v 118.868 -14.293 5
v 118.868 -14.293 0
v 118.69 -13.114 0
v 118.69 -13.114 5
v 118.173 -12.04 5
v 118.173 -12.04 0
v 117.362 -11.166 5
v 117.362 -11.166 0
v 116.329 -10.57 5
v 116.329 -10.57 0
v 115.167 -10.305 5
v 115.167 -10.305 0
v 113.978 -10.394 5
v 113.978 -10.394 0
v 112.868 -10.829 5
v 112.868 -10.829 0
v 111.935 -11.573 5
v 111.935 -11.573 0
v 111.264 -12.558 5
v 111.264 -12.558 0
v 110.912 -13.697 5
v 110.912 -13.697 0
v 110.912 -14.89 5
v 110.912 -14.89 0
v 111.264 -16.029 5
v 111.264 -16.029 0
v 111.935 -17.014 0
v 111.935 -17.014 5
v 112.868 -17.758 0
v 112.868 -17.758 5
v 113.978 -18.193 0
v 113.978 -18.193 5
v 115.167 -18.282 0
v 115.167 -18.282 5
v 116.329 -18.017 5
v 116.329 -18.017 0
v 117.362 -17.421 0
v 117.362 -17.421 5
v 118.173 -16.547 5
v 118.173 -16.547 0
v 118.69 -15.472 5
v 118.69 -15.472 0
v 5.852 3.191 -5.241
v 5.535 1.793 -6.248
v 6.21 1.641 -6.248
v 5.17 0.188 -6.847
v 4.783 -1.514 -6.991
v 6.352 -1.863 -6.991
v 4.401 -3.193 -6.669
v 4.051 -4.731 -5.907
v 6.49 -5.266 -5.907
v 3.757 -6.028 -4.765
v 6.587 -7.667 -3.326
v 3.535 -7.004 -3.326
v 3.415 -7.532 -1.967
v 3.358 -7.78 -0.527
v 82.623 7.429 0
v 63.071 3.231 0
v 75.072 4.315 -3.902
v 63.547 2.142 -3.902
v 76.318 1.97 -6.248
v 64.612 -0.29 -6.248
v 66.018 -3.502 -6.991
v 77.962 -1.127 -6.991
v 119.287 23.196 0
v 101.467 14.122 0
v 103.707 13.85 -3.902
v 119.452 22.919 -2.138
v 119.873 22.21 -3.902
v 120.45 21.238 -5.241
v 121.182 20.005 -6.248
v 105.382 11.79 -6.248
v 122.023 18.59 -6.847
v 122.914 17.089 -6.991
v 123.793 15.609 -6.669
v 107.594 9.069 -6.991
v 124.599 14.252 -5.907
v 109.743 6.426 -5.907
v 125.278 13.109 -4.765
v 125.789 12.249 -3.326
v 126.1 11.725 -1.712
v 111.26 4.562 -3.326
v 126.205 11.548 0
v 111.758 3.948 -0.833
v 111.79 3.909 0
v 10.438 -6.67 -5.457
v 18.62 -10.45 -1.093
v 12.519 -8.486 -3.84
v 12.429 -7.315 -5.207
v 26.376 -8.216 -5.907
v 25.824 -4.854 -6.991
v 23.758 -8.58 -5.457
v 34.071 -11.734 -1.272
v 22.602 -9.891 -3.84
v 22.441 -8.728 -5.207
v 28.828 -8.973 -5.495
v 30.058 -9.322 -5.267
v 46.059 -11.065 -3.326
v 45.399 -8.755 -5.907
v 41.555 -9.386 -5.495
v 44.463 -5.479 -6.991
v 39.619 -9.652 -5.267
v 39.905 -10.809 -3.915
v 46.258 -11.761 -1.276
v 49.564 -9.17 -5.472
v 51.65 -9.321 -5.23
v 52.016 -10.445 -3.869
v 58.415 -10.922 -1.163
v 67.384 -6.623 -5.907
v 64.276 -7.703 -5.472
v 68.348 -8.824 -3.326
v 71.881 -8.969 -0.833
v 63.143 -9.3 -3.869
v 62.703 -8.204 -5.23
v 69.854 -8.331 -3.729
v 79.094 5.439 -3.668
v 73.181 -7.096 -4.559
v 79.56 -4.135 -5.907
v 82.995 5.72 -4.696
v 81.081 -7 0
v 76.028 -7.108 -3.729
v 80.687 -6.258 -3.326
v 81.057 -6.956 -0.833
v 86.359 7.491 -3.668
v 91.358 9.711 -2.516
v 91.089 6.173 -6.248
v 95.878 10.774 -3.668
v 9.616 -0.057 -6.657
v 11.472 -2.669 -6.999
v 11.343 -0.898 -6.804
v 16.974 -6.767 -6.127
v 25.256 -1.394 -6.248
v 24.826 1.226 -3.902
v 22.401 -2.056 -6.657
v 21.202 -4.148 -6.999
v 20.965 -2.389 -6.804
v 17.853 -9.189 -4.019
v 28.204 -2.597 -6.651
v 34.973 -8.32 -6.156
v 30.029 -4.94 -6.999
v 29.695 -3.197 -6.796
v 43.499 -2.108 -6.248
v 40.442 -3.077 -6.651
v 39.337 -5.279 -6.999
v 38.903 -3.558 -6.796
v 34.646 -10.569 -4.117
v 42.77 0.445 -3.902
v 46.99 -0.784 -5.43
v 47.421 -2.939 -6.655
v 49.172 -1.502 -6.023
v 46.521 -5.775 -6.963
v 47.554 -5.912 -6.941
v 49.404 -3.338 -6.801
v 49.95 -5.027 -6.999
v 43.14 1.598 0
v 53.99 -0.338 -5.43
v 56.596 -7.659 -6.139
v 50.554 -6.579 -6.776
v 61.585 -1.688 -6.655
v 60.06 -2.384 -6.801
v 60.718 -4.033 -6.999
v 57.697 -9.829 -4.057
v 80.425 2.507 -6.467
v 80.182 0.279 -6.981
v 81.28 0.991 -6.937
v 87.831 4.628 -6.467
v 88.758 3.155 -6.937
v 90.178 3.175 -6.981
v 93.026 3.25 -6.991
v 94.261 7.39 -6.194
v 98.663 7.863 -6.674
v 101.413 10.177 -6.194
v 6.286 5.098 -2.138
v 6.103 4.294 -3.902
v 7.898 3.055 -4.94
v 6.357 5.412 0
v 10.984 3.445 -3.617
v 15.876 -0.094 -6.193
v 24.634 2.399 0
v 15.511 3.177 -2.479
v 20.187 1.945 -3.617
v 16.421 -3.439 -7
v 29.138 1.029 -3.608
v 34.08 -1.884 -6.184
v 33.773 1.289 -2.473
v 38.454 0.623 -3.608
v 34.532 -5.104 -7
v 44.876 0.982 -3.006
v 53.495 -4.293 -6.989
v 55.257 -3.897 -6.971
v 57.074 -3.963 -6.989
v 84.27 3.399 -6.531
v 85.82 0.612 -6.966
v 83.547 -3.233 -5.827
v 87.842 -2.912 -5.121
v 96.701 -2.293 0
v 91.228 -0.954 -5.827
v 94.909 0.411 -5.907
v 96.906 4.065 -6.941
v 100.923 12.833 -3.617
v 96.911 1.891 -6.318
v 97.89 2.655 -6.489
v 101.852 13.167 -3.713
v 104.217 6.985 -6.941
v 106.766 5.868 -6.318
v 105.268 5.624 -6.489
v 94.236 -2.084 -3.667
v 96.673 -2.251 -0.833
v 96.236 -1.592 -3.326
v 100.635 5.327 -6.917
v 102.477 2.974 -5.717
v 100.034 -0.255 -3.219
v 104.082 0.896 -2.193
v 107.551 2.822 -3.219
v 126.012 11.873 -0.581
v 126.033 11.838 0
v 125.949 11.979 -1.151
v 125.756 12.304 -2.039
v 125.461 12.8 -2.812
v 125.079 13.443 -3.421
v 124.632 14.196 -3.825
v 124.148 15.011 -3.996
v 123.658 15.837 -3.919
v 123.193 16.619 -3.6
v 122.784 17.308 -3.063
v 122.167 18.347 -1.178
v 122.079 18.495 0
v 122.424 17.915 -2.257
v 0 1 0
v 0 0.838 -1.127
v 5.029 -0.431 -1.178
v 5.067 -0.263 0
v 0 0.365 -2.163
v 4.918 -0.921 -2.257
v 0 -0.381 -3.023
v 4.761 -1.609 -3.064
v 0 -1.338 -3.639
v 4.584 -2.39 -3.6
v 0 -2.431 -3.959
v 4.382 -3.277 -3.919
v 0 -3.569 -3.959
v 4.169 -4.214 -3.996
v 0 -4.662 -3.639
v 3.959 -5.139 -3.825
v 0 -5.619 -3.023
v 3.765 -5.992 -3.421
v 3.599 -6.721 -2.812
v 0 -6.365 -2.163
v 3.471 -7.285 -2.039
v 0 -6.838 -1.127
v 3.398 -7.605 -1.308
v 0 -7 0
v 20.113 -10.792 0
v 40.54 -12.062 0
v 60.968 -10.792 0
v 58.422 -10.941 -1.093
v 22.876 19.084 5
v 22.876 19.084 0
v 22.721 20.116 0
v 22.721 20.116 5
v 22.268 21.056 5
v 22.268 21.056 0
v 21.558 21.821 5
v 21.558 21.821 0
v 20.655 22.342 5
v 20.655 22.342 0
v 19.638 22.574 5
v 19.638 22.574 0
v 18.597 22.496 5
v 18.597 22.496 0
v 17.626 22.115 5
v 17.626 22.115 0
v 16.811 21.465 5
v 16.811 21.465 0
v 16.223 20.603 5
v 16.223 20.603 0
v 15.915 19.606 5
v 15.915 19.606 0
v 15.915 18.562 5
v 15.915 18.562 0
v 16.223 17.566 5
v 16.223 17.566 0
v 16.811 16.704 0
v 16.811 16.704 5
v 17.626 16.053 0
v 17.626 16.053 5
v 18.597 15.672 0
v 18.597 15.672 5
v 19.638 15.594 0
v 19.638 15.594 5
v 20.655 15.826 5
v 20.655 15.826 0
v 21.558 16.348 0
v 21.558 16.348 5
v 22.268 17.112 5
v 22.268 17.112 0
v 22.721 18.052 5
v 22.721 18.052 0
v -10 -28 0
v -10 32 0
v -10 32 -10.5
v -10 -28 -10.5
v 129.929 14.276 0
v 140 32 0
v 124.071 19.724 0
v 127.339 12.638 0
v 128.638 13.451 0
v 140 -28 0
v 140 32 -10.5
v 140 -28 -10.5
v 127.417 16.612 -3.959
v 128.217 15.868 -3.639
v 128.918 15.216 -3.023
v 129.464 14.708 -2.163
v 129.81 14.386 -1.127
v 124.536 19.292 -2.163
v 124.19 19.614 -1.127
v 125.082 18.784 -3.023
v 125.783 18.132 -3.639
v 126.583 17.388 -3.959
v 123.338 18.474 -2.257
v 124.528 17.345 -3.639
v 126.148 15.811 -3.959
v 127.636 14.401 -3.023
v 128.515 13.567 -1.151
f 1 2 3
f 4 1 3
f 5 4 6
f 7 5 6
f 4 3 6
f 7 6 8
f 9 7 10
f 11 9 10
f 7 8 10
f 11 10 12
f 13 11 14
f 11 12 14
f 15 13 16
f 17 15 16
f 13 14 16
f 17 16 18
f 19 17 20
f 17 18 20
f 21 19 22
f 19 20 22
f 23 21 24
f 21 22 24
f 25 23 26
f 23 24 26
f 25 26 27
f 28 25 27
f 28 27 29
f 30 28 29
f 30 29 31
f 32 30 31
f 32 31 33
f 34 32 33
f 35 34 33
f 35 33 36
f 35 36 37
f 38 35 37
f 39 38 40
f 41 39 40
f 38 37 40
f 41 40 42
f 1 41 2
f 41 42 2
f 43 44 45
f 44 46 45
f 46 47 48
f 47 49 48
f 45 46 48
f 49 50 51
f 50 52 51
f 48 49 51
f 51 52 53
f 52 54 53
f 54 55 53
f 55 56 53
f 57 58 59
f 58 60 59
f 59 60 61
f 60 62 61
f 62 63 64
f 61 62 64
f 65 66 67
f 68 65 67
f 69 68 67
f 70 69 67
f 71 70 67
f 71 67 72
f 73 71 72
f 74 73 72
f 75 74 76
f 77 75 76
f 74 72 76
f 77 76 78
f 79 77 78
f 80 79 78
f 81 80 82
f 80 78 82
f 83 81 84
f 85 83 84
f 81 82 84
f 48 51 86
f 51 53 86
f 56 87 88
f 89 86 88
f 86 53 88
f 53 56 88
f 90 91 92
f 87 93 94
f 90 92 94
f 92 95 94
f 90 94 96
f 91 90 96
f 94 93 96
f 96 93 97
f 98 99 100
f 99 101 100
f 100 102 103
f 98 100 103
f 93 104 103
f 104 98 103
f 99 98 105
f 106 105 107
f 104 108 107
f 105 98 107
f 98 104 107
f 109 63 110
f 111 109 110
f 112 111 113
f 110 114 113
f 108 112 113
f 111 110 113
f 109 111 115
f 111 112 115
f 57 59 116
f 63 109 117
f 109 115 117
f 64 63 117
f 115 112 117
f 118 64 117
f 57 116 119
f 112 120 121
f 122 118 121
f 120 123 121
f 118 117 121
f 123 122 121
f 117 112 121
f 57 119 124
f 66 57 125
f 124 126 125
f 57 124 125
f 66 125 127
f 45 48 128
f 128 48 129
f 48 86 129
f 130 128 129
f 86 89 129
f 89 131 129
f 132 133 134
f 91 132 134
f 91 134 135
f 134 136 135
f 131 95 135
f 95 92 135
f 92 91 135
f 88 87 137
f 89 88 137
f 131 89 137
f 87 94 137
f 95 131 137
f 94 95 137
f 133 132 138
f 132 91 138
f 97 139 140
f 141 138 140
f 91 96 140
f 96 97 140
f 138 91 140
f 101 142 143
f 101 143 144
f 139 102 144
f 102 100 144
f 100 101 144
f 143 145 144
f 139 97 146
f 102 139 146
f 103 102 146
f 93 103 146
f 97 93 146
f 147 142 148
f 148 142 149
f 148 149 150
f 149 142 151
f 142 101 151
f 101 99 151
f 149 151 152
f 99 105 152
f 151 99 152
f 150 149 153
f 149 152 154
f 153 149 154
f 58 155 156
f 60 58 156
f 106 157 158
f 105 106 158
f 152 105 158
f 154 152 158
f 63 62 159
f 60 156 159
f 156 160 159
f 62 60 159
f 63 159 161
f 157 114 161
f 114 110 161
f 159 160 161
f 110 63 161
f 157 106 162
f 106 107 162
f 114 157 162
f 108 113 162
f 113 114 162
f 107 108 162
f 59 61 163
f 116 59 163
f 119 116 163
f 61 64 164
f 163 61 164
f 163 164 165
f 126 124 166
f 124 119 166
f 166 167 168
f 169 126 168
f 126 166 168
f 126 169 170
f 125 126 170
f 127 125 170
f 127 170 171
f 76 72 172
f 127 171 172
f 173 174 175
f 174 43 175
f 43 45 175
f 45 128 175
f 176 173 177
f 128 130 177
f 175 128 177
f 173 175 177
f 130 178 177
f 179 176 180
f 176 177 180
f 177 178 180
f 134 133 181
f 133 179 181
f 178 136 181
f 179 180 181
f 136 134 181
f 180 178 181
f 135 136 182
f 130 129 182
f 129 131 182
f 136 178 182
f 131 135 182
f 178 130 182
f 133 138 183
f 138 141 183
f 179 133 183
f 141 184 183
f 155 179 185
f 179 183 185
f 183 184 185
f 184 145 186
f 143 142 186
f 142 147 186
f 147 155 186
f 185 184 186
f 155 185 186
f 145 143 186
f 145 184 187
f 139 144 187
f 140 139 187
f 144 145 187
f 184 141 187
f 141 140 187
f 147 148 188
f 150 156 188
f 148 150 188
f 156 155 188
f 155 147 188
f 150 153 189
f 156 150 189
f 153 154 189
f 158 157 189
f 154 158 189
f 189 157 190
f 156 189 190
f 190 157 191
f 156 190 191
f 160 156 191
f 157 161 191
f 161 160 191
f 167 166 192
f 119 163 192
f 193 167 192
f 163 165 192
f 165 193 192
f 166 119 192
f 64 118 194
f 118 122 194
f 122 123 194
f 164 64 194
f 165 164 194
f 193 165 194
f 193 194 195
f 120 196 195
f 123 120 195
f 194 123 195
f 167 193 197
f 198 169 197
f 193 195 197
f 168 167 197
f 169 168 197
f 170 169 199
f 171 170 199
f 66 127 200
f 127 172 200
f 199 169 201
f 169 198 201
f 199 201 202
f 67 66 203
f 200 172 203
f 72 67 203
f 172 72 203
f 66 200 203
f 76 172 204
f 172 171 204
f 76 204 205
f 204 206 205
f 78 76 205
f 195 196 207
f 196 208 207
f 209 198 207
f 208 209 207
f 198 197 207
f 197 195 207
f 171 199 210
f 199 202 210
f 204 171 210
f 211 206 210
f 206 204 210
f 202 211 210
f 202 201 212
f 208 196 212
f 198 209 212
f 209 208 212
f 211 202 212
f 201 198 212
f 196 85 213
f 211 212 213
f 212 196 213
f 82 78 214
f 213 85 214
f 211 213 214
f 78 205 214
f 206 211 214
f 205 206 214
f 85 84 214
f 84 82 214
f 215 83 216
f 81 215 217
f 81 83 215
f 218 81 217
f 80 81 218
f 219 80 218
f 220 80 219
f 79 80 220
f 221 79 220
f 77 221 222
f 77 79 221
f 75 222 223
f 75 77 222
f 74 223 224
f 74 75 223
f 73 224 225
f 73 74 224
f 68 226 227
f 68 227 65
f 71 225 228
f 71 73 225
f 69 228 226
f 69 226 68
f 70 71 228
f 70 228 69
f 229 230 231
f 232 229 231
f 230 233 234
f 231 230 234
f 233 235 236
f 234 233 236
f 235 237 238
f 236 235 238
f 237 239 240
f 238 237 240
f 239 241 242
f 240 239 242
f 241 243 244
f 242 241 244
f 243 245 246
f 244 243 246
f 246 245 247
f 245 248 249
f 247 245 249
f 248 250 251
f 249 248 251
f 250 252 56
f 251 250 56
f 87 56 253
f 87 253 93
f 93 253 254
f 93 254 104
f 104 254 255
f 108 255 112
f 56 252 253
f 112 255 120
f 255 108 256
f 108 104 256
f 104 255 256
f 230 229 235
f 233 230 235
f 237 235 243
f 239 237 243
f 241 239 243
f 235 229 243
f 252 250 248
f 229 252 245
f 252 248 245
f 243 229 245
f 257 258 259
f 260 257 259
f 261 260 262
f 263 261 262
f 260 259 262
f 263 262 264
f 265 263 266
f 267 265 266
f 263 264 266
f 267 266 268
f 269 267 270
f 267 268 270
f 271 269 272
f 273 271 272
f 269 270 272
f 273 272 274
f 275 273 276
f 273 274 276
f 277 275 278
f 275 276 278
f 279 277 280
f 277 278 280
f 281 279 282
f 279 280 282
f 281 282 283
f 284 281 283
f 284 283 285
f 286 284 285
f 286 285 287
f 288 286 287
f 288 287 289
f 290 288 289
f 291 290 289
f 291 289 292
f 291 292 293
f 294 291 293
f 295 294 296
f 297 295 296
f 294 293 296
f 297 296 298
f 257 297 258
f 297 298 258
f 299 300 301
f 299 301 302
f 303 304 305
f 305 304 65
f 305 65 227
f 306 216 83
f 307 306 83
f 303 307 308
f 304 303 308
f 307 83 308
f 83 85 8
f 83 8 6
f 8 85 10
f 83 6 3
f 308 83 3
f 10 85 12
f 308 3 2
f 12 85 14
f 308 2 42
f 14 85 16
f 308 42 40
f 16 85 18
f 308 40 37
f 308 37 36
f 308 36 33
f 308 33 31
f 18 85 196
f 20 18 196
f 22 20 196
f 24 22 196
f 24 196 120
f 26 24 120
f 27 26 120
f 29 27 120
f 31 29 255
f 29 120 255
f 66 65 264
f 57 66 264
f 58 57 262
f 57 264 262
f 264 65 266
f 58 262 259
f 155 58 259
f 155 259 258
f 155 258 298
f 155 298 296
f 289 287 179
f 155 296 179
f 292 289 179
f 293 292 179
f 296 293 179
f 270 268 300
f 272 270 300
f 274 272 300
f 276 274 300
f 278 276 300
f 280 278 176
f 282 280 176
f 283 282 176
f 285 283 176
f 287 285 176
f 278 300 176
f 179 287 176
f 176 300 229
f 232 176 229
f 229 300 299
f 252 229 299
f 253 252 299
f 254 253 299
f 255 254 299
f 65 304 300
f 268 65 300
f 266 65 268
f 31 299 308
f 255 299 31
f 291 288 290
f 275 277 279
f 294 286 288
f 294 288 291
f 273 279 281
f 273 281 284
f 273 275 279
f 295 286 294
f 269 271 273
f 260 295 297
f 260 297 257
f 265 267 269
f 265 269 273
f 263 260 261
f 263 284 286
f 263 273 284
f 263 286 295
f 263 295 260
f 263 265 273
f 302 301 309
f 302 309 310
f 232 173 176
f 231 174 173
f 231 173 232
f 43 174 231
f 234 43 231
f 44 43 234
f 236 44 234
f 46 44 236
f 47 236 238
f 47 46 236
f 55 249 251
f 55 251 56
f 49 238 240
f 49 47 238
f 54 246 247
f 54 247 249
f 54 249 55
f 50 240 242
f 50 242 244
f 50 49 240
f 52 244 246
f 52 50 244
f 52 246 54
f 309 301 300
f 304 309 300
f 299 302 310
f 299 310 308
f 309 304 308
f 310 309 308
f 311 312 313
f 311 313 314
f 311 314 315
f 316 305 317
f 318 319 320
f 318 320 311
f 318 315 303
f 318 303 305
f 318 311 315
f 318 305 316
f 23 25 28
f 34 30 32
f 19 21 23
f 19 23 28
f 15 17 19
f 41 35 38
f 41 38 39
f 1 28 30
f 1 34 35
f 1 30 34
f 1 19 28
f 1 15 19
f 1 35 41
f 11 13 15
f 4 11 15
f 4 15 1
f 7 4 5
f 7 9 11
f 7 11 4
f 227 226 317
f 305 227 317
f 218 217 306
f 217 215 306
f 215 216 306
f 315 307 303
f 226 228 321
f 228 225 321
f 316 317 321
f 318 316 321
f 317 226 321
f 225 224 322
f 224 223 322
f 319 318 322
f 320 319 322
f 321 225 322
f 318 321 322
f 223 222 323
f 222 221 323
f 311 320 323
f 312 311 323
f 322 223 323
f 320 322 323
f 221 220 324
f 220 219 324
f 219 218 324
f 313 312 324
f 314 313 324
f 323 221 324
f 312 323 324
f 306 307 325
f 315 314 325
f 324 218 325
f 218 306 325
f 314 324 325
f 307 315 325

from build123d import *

# Parameters (mm, degrees)
SKETCH042_R      = 4
EXTRUDE025_DEPTH = 30
SKETCH040_R      = 7
SKETCH044_W      = 60
SKETCH044_H      = 10.5
EXTRUDE027_DEPTH = 150
SKETCH046_R      = 3.5
SKETCH046_R_2    = 4
EXTRUDE029_DEPTH = 5


with BuildPart() as sweep011:
    # Sweep011: sweep along a path in Sketch
    with BuildLine(Plane.XY) as sweep011_path:
        ThreePointArc((0, 0), (65.583227, -3.22849), (127, 20))
    # Sketch042 → Sweep011 (sweep)
    with BuildSketch(Plane(origin=(0, 0, 0), x_dir=(0, -1, 0), z_dir=(-1, 0, 0))):
        Circle(SKETCH042_R)
    sweep(path=sweep011_path.line)


with BuildPart() as sweep011_1:
    # Sweep011 placement: moved
    add(sweep011.part.moved(Location((0, -3, 0))))


with BuildPart() as extrude025:
    # Sketch041 → Extrude025 (new body)
    with BuildSketch(Plane.XY.offset(-15)):
        Polygon((-8.268976, 21.973037), (10.121624, 21.973037), (-0.555824, -25), (-25.401805, -25), align=None)
        Polygon((105.81268, 45.885295), (155.276998, 45.885295), (207.473539, -4.114705), (135.506671, -4.114705), align=None)
    extrude(amount=EXTRUDE025_DEPTH)


with BuildPart() as motor_tube_outer003:
    # Sweep009: sweep along a path in Sketch
    with BuildLine(Plane.XY) as sweep009_path:
        ThreePointArc((0, 0), (65.583227, -3.22849), (127, 20))
    # Sketch040 → Sweep009 (sweep)
    with BuildSketch(Plane(origin=(0, 0, 0), x_dir=(0, -1, 0), z_dir=(-1, 0, 0))):
        Circle(SKETCH040_R)
    sweep(path=sweep009_path.line)

    # Cut010: cut Extrude025
    add(extrude025.part, mode=Mode.SUBTRACT)

    # Fusion010: union Sweep011
    add(sweep011_1.part)


with BuildPart() as cut013:
    # Sketch044 → Extrude027 (new body)
    with BuildSketch(Plane(origin=(-10, 0, 0), x_dir=(0, -1, 0), z_dir=(-1, 0, 0))):
        with Locations((-2, -5.25)):
            Rectangle(SKETCH044_W, SKETCH044_H)
    extrude(amount=-EXTRUDE027_DEPTH)

    # Cut013: cut Motor Tube Outer003
    add(motor_tube_outer003.part, mode=Mode.SUBTRACT)


with BuildPart() as motor_mold_bottom:
    # Sketch046 → Extrude029 (new body)
    with BuildSketch(Plane.XY):
        with Locations((19.376185, 19.084115)):
            Circle(SKETCH046_R)
        with Locations((114.867691, -14.293477)):
            Circle(SKETCH046_R_2)
    extrude(amount=EXTRUDE029_DEPTH)

    # Fusion013: union Cut013
    add(cut013.part)


solid = motor_mold_bottom.part
